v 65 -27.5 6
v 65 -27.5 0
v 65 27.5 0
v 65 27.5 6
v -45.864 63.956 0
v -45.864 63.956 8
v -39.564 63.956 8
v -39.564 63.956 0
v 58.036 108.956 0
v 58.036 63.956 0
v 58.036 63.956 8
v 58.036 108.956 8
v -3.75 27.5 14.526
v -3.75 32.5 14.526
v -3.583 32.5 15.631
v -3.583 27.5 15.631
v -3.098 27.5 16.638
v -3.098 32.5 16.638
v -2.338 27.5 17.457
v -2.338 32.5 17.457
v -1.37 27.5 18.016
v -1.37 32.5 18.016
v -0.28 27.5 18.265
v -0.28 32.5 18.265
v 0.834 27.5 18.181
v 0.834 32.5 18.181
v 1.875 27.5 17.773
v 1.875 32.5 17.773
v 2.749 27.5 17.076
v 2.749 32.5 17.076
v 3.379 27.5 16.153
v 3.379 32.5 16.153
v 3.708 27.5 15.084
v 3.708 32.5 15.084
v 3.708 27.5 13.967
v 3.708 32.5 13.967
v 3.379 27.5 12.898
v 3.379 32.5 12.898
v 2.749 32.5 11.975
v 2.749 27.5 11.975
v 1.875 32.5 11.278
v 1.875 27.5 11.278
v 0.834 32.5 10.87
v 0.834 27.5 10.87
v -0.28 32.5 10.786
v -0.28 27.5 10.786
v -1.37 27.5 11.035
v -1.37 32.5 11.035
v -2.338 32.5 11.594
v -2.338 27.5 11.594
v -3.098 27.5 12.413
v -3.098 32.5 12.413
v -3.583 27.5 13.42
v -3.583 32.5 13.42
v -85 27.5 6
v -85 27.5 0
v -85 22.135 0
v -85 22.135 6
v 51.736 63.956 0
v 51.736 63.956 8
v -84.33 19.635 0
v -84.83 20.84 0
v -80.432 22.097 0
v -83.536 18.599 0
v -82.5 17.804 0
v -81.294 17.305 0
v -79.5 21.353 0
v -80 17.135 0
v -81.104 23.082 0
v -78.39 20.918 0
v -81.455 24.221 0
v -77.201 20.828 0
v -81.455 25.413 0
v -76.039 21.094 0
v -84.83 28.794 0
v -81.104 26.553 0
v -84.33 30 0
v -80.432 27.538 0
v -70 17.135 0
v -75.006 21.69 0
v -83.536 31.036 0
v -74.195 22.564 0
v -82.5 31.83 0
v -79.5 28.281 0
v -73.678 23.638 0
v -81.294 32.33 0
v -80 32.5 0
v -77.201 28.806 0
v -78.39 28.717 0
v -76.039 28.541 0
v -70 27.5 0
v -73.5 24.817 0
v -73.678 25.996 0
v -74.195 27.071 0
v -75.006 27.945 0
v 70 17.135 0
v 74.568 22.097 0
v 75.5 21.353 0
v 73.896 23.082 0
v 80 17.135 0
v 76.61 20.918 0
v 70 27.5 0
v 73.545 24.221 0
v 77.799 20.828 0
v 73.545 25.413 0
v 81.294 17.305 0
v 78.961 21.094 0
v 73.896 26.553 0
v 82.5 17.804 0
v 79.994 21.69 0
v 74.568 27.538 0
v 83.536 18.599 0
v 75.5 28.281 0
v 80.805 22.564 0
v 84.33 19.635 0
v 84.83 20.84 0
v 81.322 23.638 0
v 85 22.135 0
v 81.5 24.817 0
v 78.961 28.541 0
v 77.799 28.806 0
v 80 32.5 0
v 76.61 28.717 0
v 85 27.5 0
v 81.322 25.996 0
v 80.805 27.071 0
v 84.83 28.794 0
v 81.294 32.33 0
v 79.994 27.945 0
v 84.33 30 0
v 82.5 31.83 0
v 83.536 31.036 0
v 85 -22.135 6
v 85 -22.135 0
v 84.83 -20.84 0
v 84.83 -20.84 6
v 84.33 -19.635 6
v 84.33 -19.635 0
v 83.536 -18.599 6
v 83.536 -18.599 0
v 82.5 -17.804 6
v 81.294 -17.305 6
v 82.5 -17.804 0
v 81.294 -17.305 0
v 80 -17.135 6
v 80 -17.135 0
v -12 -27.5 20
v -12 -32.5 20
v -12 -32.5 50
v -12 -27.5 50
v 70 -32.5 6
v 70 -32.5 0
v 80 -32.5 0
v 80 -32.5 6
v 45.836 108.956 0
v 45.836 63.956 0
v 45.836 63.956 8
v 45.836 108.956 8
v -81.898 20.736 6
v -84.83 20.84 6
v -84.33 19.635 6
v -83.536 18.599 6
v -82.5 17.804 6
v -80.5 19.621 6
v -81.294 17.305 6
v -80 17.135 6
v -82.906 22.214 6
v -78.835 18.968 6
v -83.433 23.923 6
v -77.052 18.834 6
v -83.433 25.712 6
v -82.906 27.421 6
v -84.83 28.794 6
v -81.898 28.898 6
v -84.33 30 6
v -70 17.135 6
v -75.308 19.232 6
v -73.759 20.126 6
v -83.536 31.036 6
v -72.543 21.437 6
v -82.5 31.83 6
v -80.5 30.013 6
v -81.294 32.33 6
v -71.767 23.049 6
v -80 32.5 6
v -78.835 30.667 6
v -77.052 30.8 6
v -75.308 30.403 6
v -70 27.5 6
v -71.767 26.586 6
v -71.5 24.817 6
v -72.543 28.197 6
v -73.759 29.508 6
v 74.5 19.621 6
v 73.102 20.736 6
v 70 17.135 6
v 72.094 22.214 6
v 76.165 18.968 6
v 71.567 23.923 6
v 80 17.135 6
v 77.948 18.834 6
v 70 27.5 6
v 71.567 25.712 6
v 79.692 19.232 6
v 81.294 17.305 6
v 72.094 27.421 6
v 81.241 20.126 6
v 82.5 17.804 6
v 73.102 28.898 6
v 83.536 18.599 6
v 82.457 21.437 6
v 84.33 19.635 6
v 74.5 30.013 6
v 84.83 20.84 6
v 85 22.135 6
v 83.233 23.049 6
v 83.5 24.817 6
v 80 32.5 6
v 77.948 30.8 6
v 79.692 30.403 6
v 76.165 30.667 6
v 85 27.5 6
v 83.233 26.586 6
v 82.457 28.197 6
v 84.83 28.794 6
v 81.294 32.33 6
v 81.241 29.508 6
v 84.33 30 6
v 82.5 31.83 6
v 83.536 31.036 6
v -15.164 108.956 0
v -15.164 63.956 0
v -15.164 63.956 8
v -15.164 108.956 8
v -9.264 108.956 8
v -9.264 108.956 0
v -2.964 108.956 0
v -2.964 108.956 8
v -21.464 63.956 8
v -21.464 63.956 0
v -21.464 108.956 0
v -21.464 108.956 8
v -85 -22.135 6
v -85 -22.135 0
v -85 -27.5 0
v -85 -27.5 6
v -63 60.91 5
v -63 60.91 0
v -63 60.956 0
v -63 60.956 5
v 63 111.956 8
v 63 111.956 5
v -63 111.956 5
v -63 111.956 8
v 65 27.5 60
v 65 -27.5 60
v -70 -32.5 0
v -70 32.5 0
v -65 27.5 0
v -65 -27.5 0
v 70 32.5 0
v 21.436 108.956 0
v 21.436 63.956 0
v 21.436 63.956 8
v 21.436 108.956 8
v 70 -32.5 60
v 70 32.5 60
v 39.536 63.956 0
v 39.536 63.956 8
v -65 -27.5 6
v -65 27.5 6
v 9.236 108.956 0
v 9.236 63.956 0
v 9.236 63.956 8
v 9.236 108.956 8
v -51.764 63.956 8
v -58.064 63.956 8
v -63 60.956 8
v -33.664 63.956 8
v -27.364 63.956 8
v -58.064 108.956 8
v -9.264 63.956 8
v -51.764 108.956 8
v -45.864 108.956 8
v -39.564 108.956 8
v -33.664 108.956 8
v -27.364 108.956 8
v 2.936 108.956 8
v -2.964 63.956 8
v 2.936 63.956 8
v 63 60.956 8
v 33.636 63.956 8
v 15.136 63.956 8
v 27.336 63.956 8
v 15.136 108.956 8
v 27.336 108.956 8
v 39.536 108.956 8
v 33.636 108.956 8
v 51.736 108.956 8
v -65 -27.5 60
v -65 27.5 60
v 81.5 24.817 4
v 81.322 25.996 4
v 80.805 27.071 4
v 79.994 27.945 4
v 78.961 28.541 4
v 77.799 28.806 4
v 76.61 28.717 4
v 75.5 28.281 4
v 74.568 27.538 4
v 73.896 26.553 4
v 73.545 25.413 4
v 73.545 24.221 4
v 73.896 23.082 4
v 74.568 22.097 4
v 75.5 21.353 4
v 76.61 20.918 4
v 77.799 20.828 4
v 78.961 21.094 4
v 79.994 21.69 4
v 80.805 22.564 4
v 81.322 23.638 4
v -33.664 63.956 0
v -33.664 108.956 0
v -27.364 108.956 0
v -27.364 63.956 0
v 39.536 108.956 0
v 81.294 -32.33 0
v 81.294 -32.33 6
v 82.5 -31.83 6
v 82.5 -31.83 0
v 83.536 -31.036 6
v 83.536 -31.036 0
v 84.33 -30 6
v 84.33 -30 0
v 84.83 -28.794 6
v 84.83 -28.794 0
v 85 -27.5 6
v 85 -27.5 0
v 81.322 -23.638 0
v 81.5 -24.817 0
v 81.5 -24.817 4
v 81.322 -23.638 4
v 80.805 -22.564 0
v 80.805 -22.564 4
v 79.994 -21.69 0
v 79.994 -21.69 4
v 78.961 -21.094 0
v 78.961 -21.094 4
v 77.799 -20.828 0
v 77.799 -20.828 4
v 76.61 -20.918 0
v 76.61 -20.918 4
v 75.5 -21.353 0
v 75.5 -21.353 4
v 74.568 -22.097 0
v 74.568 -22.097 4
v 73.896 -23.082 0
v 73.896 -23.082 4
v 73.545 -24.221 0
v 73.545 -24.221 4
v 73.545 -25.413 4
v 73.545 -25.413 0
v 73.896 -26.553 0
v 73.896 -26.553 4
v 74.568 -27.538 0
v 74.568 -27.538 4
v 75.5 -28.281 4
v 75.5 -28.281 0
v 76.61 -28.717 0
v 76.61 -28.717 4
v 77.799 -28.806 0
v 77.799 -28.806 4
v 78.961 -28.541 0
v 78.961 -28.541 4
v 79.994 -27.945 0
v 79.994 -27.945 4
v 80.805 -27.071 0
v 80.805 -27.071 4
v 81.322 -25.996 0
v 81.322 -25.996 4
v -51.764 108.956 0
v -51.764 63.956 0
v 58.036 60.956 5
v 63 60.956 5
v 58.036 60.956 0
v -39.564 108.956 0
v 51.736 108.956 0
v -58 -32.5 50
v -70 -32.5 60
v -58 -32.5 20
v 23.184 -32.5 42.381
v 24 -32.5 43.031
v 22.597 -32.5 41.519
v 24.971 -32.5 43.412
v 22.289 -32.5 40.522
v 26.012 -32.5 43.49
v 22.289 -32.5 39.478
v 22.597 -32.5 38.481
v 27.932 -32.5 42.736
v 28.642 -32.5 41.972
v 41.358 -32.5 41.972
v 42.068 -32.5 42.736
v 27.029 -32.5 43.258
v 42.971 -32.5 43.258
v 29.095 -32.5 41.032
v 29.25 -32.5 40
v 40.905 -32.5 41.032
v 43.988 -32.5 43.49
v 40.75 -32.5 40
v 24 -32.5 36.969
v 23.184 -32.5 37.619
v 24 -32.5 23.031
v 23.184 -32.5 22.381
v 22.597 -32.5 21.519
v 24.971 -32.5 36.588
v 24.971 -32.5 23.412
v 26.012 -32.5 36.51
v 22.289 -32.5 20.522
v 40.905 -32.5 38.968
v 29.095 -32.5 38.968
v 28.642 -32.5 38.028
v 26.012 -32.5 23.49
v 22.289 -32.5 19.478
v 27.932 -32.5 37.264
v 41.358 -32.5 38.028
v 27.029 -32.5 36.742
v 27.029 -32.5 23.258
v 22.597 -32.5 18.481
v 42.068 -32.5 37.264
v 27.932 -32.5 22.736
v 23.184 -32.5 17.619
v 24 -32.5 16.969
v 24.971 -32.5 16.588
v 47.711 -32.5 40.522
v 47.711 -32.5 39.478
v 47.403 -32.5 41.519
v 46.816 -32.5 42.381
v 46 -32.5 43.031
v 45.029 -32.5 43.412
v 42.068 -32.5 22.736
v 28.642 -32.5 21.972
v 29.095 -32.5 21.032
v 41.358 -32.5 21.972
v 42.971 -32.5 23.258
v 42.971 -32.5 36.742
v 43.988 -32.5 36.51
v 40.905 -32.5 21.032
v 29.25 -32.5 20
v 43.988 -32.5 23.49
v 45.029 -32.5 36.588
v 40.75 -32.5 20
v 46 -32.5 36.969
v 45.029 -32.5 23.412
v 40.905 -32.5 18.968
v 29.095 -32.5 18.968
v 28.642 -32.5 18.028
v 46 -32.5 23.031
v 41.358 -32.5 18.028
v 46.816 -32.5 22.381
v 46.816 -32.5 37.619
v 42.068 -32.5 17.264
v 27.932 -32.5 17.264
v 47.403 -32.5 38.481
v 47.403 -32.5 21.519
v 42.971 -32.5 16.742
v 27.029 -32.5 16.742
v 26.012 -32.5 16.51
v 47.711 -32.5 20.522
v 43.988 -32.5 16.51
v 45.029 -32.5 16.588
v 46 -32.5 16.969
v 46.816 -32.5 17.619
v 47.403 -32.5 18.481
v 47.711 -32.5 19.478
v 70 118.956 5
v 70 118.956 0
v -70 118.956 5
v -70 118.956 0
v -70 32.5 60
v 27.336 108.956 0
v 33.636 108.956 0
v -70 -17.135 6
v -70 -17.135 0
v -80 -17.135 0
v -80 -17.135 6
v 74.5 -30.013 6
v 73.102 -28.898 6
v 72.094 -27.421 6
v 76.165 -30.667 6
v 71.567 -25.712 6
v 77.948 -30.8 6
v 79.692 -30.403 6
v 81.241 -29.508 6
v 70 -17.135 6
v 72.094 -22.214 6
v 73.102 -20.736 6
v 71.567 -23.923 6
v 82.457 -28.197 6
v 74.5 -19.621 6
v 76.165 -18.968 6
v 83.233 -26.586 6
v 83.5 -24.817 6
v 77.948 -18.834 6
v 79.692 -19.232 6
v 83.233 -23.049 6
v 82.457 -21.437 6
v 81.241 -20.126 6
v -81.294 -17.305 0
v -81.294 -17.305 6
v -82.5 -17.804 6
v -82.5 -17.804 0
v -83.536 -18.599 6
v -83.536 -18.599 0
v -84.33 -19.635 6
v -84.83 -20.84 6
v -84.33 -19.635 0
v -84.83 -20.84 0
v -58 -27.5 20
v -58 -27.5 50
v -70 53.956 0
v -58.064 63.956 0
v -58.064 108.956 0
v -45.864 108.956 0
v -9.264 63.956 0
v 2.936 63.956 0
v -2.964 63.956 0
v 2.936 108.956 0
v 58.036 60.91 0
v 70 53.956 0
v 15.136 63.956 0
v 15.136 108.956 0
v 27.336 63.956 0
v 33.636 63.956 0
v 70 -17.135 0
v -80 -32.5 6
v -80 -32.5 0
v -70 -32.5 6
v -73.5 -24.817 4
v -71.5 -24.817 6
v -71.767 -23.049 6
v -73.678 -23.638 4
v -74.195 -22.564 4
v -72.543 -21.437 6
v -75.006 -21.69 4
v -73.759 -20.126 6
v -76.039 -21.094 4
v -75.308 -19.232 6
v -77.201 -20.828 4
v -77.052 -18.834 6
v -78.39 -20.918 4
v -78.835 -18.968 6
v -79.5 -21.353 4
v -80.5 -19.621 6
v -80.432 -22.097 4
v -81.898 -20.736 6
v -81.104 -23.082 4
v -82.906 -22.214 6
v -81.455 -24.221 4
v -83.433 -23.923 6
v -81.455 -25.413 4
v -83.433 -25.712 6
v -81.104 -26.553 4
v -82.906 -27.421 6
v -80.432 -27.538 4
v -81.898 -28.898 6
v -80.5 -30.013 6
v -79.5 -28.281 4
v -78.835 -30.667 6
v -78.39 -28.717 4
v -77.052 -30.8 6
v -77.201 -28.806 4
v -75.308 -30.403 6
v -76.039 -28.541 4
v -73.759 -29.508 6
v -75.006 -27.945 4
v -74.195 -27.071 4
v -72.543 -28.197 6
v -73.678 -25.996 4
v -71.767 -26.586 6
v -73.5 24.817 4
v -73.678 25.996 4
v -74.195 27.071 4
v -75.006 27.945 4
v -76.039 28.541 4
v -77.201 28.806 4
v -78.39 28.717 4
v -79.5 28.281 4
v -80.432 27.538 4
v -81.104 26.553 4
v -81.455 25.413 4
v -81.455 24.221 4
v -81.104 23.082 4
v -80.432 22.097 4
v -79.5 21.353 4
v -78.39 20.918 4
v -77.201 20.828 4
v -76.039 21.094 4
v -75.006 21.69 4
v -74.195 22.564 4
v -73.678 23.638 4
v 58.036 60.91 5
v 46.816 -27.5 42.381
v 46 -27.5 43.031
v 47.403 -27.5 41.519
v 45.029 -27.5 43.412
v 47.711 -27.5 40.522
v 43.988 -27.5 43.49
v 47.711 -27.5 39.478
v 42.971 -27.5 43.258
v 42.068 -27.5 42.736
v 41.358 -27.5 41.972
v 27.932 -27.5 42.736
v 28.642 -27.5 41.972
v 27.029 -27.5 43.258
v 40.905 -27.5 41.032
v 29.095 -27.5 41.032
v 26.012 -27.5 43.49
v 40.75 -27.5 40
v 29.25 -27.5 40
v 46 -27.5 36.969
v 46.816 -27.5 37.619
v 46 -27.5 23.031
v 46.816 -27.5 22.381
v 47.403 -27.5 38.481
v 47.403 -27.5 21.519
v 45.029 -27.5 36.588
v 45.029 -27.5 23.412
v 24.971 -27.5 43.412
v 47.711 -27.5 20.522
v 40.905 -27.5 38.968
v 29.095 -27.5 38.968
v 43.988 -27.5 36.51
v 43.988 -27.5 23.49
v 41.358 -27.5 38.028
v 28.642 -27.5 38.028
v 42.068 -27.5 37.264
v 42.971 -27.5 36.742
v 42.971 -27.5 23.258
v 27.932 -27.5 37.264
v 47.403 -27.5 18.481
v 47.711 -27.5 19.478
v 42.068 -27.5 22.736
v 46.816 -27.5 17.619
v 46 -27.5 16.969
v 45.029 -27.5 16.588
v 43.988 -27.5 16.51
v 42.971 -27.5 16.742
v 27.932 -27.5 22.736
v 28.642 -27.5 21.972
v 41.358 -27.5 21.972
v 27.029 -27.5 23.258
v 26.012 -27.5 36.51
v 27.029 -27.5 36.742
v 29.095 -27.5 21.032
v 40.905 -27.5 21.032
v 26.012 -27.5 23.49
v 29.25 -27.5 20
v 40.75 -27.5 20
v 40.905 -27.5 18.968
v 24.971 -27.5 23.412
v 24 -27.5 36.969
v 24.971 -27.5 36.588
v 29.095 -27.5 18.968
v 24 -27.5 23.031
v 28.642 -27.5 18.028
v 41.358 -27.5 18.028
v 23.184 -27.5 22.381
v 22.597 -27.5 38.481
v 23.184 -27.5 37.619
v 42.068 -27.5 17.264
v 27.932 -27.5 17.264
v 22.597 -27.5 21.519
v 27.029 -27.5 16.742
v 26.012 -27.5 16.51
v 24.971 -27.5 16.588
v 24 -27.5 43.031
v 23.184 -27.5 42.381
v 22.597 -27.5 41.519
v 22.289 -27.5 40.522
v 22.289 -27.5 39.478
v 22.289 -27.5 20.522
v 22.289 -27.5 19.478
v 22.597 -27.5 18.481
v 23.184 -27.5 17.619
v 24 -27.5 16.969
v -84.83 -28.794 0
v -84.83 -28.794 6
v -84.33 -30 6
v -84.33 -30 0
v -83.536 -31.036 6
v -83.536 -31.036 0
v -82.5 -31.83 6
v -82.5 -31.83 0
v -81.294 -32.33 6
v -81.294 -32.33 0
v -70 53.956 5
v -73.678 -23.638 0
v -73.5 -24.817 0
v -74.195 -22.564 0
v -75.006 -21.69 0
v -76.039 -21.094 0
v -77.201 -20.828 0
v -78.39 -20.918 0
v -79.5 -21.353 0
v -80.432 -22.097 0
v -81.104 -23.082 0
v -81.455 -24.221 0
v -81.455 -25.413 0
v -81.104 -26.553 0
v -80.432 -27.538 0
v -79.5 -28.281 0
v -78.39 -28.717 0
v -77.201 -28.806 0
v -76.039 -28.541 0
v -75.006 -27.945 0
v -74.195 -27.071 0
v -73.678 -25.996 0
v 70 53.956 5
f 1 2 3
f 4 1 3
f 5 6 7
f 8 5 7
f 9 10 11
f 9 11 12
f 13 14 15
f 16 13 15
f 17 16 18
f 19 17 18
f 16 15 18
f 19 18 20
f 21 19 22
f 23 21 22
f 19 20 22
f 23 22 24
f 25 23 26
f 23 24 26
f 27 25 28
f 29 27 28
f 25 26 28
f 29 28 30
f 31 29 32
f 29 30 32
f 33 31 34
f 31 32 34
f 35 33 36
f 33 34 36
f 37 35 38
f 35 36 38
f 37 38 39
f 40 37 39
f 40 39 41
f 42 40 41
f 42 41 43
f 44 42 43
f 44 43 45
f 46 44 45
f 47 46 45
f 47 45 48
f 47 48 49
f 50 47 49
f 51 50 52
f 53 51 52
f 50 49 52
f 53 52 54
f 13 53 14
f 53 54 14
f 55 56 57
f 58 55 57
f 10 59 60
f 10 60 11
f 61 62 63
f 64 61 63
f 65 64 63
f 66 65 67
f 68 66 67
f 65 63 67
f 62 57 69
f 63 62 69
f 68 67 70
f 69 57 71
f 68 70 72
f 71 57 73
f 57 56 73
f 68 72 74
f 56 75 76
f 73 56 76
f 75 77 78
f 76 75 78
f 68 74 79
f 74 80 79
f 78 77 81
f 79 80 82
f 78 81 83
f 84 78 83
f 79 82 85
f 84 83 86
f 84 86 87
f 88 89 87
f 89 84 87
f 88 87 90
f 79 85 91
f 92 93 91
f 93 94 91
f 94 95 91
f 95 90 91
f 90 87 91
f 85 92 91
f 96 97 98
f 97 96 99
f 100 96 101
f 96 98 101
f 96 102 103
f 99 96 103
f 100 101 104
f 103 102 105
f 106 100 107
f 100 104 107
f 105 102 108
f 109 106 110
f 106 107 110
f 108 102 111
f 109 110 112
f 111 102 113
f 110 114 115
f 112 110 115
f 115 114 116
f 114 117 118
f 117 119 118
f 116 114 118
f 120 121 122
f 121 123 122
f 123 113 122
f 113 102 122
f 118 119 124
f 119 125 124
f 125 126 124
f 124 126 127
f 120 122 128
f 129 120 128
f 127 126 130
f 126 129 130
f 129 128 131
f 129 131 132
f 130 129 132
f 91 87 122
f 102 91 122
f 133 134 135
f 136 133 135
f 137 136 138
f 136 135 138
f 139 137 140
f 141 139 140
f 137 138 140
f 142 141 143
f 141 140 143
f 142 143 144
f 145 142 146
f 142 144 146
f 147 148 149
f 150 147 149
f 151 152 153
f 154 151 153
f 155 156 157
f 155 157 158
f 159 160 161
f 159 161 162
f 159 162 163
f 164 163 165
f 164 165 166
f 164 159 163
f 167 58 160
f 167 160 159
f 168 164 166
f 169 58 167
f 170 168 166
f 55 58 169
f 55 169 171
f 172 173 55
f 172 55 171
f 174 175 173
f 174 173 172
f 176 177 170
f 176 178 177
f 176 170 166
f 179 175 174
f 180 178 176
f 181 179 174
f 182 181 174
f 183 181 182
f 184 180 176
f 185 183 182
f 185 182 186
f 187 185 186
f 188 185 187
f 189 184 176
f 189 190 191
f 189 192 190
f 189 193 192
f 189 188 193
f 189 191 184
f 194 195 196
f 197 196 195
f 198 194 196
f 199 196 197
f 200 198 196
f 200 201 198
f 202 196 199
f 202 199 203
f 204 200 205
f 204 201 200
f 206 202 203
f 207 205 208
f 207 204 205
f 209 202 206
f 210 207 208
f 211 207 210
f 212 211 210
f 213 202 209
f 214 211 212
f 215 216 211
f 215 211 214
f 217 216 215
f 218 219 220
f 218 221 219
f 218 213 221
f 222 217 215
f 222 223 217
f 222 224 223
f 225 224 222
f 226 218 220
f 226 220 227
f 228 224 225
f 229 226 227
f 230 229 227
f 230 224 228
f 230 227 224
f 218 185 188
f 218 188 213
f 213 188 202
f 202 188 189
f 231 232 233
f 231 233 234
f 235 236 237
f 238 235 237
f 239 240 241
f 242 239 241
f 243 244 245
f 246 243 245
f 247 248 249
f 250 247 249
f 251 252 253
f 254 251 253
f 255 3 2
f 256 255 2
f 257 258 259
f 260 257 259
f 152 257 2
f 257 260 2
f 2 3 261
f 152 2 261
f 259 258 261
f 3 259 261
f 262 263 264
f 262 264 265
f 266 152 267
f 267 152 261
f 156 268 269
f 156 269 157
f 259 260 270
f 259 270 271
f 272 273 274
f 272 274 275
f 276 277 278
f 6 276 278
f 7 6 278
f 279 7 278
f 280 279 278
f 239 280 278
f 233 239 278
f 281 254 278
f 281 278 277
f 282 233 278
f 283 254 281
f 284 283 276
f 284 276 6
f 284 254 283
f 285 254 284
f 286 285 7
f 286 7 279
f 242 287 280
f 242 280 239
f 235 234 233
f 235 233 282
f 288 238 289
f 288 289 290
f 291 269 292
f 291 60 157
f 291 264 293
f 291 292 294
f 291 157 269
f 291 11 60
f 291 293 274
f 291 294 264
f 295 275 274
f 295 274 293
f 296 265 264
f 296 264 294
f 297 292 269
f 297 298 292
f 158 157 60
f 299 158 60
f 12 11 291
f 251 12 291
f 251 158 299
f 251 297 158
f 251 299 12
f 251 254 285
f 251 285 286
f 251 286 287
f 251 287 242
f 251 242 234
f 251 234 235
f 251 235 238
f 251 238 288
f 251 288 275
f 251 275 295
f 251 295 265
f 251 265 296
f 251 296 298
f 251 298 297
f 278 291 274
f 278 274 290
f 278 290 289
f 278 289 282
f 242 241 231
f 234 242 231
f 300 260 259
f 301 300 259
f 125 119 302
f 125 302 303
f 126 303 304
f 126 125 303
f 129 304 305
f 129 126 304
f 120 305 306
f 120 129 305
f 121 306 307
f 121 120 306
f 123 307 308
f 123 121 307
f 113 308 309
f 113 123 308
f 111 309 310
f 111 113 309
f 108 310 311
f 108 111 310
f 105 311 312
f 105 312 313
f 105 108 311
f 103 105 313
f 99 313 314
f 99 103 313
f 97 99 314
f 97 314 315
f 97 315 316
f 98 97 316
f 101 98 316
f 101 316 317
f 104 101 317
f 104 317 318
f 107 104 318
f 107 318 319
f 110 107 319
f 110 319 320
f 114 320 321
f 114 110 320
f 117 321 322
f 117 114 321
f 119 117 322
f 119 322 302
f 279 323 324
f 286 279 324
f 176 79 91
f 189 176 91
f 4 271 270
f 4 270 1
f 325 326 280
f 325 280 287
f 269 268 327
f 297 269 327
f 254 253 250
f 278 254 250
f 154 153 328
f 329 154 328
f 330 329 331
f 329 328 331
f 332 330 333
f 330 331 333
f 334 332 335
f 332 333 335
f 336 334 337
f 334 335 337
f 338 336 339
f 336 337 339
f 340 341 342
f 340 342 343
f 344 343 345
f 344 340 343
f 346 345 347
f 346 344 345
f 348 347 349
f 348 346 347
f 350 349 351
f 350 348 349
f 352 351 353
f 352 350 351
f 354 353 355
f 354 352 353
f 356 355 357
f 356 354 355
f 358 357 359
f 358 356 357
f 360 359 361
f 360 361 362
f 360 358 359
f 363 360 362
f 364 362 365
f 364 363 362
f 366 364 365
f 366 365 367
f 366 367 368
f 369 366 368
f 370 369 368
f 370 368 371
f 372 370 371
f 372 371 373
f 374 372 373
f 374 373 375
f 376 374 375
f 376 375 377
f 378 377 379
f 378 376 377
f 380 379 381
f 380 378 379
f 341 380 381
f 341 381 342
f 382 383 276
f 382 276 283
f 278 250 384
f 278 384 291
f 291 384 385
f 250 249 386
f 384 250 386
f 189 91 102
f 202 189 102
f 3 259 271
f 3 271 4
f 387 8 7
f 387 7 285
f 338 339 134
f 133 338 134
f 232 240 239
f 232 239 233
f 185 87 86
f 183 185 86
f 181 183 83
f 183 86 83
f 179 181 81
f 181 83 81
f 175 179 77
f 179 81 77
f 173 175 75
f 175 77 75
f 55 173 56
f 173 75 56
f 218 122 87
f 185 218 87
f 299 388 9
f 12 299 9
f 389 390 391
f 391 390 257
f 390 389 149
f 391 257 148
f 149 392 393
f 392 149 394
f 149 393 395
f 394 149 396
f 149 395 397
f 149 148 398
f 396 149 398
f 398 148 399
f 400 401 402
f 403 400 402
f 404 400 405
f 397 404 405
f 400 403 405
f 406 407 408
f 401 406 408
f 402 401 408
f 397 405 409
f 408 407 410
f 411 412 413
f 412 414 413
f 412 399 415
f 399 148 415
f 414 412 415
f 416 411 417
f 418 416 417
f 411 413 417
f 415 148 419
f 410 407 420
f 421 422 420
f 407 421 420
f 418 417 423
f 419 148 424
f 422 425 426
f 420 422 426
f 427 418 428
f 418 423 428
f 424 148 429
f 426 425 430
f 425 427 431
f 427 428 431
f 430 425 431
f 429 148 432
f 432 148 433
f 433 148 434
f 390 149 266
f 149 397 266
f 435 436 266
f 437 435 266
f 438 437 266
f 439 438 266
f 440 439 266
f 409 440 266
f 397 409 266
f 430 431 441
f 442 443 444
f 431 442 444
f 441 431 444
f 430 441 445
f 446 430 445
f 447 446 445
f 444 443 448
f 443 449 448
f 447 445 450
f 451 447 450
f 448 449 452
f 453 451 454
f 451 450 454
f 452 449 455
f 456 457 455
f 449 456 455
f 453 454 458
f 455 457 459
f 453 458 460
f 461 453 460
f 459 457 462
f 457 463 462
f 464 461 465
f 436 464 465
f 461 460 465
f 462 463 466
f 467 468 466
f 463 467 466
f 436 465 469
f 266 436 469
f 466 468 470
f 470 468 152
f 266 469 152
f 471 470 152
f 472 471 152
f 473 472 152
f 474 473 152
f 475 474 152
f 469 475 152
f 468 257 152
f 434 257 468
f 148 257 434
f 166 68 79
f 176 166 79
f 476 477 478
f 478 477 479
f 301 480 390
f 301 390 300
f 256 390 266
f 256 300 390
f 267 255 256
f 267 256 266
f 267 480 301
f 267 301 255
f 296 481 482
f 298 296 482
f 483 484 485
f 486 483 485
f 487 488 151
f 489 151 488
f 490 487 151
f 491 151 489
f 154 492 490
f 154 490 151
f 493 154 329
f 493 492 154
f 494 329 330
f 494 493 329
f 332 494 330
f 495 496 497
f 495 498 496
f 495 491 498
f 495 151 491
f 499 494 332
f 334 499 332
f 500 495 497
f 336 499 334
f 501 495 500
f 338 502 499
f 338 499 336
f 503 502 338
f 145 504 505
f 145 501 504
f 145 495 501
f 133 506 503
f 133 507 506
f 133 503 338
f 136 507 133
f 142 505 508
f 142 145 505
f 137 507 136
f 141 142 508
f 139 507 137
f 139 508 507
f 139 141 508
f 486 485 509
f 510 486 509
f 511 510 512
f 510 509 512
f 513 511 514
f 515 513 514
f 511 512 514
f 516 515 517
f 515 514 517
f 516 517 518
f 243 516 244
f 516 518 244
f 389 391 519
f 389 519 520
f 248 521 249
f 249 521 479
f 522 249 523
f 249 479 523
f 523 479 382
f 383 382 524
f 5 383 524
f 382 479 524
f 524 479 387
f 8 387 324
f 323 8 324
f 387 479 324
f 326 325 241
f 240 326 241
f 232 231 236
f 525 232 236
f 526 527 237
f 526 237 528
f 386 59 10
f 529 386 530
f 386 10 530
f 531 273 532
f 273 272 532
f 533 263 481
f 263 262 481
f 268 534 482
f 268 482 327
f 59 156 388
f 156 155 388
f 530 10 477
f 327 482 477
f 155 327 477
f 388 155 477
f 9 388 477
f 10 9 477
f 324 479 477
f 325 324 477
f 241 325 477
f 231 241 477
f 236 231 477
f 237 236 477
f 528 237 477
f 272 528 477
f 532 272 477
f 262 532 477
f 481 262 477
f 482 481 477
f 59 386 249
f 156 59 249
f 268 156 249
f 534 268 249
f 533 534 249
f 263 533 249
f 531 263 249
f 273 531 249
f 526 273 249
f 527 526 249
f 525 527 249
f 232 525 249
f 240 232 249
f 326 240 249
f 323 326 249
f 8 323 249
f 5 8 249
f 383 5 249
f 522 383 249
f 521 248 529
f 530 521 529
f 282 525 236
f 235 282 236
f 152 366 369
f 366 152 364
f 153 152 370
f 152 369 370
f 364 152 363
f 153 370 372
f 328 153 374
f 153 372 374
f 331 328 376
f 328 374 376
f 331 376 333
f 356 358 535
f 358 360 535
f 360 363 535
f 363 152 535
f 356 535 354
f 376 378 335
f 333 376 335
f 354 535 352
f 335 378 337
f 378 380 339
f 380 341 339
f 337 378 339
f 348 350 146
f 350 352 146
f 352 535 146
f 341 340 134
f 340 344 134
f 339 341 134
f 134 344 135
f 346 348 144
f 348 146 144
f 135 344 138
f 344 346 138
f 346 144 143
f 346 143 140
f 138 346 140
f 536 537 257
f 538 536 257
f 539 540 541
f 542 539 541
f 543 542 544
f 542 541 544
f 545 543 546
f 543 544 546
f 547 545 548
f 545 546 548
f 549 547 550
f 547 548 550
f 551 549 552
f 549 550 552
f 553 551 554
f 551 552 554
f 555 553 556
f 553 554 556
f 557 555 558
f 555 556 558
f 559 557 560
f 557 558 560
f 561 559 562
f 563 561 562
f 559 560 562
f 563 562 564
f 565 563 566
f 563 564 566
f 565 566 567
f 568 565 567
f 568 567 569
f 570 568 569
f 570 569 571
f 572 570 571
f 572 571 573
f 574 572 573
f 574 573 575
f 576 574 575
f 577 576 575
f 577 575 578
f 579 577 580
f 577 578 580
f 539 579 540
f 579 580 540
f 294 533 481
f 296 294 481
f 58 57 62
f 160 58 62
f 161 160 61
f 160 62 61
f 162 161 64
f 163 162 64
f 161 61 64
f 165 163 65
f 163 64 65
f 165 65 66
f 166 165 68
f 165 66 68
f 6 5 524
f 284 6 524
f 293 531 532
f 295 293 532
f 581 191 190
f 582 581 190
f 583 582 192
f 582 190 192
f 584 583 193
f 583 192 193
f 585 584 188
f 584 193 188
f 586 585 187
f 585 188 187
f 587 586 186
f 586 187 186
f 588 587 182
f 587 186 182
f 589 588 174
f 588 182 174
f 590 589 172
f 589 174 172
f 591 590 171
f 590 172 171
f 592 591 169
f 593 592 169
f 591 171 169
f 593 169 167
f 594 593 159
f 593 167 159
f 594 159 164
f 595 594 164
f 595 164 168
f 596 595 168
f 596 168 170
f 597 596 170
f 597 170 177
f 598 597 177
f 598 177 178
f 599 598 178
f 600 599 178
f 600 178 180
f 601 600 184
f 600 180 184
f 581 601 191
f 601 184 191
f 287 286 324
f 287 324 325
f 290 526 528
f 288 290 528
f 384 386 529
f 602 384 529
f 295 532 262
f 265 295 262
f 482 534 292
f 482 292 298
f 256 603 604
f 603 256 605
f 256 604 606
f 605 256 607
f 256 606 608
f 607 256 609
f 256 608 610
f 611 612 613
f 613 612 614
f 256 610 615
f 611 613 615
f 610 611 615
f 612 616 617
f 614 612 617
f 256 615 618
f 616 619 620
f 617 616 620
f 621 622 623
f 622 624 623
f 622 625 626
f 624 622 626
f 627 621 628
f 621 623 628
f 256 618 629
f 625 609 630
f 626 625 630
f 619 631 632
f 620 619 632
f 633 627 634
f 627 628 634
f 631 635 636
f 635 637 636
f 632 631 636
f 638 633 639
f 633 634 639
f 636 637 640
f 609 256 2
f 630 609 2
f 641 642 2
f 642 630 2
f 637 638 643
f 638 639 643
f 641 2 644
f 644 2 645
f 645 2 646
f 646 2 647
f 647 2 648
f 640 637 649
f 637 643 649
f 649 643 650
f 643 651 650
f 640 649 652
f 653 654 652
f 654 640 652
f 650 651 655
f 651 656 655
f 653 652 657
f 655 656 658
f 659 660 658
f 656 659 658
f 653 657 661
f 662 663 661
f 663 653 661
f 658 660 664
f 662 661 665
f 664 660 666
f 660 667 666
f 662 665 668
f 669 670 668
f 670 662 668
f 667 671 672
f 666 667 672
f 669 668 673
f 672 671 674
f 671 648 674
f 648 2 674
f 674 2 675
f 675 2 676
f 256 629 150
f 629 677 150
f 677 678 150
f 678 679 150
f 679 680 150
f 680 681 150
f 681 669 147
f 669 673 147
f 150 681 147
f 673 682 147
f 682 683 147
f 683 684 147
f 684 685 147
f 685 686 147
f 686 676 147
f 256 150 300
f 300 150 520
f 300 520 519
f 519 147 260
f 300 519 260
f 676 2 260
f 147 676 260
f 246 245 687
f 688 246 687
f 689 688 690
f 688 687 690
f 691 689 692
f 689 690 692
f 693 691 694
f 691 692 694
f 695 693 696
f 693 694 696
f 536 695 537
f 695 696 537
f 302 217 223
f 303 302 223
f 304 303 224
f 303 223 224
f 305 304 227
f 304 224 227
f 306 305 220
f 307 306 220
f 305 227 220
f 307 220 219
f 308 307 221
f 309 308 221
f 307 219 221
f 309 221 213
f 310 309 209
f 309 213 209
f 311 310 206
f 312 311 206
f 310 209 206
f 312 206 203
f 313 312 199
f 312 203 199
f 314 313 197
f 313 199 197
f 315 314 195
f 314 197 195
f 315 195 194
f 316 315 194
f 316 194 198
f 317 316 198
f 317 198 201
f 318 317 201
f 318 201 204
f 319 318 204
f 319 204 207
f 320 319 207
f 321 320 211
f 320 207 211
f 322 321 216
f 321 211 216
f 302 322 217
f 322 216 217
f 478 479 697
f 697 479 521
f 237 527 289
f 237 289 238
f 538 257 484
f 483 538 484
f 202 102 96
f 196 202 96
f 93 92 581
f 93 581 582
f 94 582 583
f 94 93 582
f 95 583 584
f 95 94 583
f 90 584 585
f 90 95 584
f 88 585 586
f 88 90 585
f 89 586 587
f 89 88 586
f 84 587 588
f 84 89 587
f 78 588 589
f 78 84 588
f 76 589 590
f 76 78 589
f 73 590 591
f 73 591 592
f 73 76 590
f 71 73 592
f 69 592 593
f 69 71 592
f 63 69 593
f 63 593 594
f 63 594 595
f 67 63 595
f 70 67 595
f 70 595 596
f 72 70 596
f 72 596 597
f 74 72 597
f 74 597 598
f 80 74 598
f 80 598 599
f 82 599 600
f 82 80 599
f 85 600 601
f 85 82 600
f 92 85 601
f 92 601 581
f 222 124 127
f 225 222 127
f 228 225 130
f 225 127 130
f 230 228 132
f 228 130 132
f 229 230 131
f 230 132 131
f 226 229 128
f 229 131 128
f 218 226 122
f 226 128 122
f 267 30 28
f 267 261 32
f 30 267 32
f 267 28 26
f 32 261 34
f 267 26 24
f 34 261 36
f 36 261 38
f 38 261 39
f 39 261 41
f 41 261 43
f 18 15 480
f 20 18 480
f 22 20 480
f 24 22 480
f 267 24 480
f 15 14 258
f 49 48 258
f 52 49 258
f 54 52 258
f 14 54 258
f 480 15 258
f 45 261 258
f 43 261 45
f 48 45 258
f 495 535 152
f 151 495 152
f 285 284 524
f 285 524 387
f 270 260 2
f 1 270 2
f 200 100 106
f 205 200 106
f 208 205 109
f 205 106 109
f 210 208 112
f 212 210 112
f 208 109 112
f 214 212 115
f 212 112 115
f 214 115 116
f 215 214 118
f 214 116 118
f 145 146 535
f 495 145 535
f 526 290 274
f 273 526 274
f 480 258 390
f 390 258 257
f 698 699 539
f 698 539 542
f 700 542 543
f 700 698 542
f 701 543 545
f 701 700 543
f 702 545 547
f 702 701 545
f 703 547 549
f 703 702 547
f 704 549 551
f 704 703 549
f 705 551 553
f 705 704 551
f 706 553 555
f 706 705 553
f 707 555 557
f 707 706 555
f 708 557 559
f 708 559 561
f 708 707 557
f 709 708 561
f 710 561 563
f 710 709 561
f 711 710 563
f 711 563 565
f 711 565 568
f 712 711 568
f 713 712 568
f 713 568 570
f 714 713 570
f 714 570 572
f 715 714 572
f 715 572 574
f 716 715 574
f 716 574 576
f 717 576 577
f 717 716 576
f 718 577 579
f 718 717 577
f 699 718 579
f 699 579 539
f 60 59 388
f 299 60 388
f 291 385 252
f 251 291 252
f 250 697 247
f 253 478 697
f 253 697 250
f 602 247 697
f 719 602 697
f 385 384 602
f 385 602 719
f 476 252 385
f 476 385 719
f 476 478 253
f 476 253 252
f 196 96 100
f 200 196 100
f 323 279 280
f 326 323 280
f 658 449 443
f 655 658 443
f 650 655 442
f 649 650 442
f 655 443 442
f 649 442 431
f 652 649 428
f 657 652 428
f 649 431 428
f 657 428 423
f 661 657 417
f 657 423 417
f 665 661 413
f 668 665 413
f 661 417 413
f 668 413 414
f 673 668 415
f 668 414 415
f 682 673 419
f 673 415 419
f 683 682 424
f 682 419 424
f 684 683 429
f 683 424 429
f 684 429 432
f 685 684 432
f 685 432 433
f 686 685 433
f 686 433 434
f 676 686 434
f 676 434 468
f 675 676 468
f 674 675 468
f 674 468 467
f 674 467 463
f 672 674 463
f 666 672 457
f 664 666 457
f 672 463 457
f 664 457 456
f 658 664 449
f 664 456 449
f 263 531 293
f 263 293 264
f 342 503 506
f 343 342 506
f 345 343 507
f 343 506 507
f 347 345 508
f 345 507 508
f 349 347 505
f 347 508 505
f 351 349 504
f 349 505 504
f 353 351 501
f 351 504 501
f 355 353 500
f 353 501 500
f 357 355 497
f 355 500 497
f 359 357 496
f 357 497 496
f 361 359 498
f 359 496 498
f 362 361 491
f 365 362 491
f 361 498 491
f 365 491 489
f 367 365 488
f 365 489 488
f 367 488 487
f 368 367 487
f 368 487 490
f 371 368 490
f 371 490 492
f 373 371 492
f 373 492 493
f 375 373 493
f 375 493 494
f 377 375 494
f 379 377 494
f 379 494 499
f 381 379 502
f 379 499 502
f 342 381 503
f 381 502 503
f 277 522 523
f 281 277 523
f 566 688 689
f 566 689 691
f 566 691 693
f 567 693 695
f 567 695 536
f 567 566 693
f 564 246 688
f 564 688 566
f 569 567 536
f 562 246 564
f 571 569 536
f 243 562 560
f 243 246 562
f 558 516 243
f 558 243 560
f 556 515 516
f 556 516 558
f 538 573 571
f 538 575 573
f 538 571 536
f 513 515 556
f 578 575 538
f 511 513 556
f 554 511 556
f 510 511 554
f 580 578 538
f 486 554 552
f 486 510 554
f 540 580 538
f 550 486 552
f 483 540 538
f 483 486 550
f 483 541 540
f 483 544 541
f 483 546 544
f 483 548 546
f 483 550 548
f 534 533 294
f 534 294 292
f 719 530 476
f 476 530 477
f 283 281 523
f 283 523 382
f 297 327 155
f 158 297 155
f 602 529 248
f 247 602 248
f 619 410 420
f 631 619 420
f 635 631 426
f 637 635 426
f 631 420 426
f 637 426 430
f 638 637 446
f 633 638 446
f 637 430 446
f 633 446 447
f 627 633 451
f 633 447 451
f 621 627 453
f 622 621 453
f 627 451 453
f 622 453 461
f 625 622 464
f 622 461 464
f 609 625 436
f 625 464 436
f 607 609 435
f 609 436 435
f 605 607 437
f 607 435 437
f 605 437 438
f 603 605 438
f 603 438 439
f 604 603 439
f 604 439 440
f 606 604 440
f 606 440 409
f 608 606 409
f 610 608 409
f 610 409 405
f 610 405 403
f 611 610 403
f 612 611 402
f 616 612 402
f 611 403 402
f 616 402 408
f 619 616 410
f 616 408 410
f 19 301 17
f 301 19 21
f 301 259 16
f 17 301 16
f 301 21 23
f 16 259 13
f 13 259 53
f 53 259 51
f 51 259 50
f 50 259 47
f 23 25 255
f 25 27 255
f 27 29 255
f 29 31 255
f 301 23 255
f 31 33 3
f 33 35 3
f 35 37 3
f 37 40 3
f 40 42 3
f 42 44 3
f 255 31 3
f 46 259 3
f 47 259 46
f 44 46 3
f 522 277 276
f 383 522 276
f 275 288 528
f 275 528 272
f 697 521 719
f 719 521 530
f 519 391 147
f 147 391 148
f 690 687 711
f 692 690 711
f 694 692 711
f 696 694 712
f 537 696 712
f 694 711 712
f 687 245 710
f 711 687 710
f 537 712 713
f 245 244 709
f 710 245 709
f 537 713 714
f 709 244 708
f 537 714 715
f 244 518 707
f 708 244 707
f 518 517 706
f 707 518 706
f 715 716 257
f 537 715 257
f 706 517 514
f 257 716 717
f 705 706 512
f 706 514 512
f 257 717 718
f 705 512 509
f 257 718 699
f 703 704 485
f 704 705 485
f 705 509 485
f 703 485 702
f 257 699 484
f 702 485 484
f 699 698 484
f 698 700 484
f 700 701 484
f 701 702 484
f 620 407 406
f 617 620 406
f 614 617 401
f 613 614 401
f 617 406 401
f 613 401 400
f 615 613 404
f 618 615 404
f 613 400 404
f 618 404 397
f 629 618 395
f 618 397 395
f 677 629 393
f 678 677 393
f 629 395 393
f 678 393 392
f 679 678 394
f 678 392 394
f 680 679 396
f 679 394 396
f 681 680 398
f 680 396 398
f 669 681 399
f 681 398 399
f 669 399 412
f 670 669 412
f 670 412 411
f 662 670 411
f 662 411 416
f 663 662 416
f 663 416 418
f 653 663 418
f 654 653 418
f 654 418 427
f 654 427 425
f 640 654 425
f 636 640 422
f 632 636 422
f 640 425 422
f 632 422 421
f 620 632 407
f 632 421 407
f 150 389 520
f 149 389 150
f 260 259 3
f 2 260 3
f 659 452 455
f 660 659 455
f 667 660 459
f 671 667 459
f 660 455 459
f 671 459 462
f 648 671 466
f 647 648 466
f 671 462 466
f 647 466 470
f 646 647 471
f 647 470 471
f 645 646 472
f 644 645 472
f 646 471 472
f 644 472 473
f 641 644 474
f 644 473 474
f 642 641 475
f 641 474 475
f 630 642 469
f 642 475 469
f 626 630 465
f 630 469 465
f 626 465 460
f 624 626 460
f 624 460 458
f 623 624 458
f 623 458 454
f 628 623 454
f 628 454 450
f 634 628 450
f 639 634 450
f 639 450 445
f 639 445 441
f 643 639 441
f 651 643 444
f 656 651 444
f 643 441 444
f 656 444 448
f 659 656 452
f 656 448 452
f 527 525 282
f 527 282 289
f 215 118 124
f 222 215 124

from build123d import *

# Parameters (mm, degrees)
F0_R      = 4
F0_W      = 5
F0_H      = 5
F0_W_2    = 130
F1_DEPTH  = 6
F2_SIZE   = 2
F2_2_SIZE = 2
F2_3_SIZE = 2
F3_DEPTH  = 60
F0_H_2    = 55
F4_DEPTH  = 6
F5_W      = 46
F5_H      = 30
F5_R      = 3.5
F6_DEPTH  = 5
F7_R      = 3.75
F8_DEPTH  = 5
F0_W_3    = 7
F0_H_3    = 7
F0_H_4    = 51
F9_DEPTH  = 5
F0_W_4    = 6.3
F0_H_5    = 45
F0_W_5    = 5.9
F0_W_6    = 1.9635334134
F0_W_7    = 1.9364665866
F0_H_6    = 3
F10_DEPTH = 8
F11_DEPTH = 25


with BuildPart() as f1:
    # F0 (on Top) → F1 (new body)
    with BuildSketch(Plane.XY):
        with BuildLine():
            Line((-70, 27.5), (-70, 32.5))
            Line((-70, 32.5), (-80, 32.5))
            ThreePointArc((-80, 32.5), (-83.5355339059, 31.0355339059), (-85, 27.5))
            Line((-85, 27.5), (-85, 22.1345490962))
            ThreePointArc((-85, 22.1345490962), (-83.5355339059, 18.5990151903), (-80, 17.1345490962))
            Line((-80, 17.1345490962), (-70, 17.1345490962))
            Line((-70, 17.1345490962), (-70, 27.5))
        make_face()
        with Locations((-77.5, 24.8172745481)):
            Circle(F0_R, mode=Mode.SUBTRACT)
        with Locations((-67.5, 30)):
            Rectangle(F0_W, F0_H)
        with Locations((0, 30)):
            Rectangle(F0_W_2, F0_H)
        with Locations((67.5, 30)):
            Rectangle(F0_W, F0_H)
        with BuildLine():
            Line((80, 32.5), (70, 32.5))
            Line((70, 32.5), (70, 27.5))
            Line((70, 27.5), (70, 17.1345490962))
            Line((70, 17.1345490962), (80, 17.1345490962))
            ThreePointArc((80, 17.1345490962), (83.5355339059, 18.5990151903), (85, 22.1345490962))
            Line((85, 22.1345490962), (85, 27.5))
            ThreePointArc((85, 27.5), (83.5355339059, 31.0355339059), (80, 32.5))
        make_face()
        with Locations((77.5, 24.8172745481)):
            Circle(F0_R, mode=Mode.SUBTRACT)
    extrude(amount=F1_DEPTH)

    # F2
    f2_edges = [f1.edges().sort_by_distance(p)[0] for p in [
        (-81.5, 24.817275, 6),
        (73.5, 24.817275, 6),
    ]]
    chamfer(f2_edges, length=F2_SIZE)


with BuildPart() as f1b:
    # F0 (on Top) → F1, piece 2 (new body)
    with BuildSketch(Plane.XY):
        with BuildLine():
            Line((-70, -27.5), (-70, -17.1345490962))
            Line((-70, -17.1345490962), (-80, -17.1345490962))
            ThreePointArc((-80, -17.1345490962), (-83.5355339059, -18.5990151903), (-85, -22.1345490962))
            Line((-85, -22.1345490962), (-85, -27.5))
            ThreePointArc((-85, -27.5), (-83.5355339059, -31.0355339059), (-80, -32.5))
            Line((-80, -32.5), (-70, -32.5))
            Line((-70, -32.5), (-70, -27.5))
        make_face()
        with Locations((-77.5, -24.8172745481)):
            Circle(F0_R, mode=Mode.SUBTRACT)
    extrude(amount=F1_DEPTH)

    # F2#2
    f2_2_edges = [f1b.edges().sort_by_distance(p)[0] for p in [
        (-81.5, -24.817275, 6),
    ]]
    chamfer(f2_2_edges, length=F2_2_SIZE)


with BuildPart() as f1c:
    # F0 (on Top) → F1, piece 3 (new body)
    with BuildSketch(Plane.XY):
        with BuildLine():
            Line((70, -17.1345490962), (70, -27.5))
            Line((70, -27.5), (70, -32.5))
            Line((70, -32.5), (80, -32.5))
            ThreePointArc((80, -32.5), (83.5355339059, -31.0355339059), (85, -27.5))
            Line((85, -27.5), (85, -22.1345490962))
            ThreePointArc((85, -22.1345490962), (83.5355339059, -18.5990151903), (80, -17.1345490962))
            Line((80, -17.1345490962), (70, -17.1345490962))
        make_face()
        with Locations((77.5, -24.8172745481)):
            Circle(F0_R, mode=Mode.SUBTRACT)
    extrude(amount=F1_DEPTH)

    # F2#3
    f2_3_edges = [f1c.edges().sort_by_distance(p)[0] for p in [
        (73.5, -24.817275, 6),
    ]]
    chamfer(f2_3_edges, length=F2_3_SIZE)


with BuildPart() as f3:
    # F0 (on Top) → F3 (new body)
    with BuildSketch(Plane.XY):
        Polygon((-65, 27.5), (-70, 27.5), (-70, 17.1345490962), (-70, -17.1345490962), (-70, -27.5), (-65, -27.5), align=None)
        with Locations((0, -30)):
            Rectangle(F0_W_2, F0_H)
        with Locations((-67.5, -30)):
            Rectangle(F0_W, F0_H)
        with Locations((67.5, -30)):
            Rectangle(F0_W, F0_H)
        Polygon((70, 27.5), (65, 27.5), (65, -27.5), (70, -27.5), (70, -17.1345490962), (70, 17.1345490962), align=None)
        with Locations((67.5, 30)):
            Rectangle(F0_W, F0_H)
        with Locations((0, 30)):
            Rectangle(F0_W_2, F0_H)
        with Locations((-67.5, 30)):
            Rectangle(F0_W, F0_H)
    extrude(amount=F3_DEPTH)

    # F5 (on face) → F6 (cut)
    with BuildSketch(Plane.XZ.offset(32.5)):
        with Locations((-35, 35)):
            Rectangle(F5_W, F5_H)
        with Locations((25.75, 40)):
            Circle(F5_R)
        with Locations((25.75, 20)):
            Circle(F5_R)
        with BuildLine():
            ThreePointArc((47.75, 40), (44.25, 43.5), (40.75, 40))
            ThreePointArc((40.75, 40), (44.25, 36.5), (47.75, 40))
        make_face()
        with BuildLine():
            ThreePointArc((47.75, 20), (44.25, 23.5), (40.75, 20))
            ThreePointArc((40.75, 20), (44.25, 16.5), (47.75, 20))
        make_face()
    extrude(amount=-F6_DEPTH, mode=Mode.SUBTRACT)

    # F7 (on face) → F8 (cut)
    with BuildSketch(Plane(origin=(0, 32.5, 0), x_dir=(-1, 0, 0), z_dir=(0, 1, 0))):
        with Locations((0, 14.525502791)):
            Circle(F7_R)
    extrude(amount=-F8_DEPTH, mode=Mode.SUBTRACT)


with BuildPart() as f4:
    # F0 (on Top) → F4 (new body)
    with BuildSketch(Plane.XY):
        Rectangle(F0_W_2, F0_H_2)
    extrude(amount=F4_DEPTH)


with BuildPart() as f9:
    # F0 (on Top) → F9 (new body)
    with BuildSketch(Plane.XY):
        with Locations((66.5, 115.4563803077)):
            Rectangle(F0_W_3, F0_H_3)
        Polygon((63, 118.9563803077), (-63, 118.9563803077), (-63, 112.5258132815), (-63, 111.9563803077), (-58.0635334134, 111.9563803077), (-51.7635334134, 111.9563803077), (-45.8635334134, 111.9563803077), (-39.5635334134, 111.9563803077), (-33.6635334134, 111.9563803077), (-27.3635334134, 111.9563803077), (-21.4635334134, 111.9563803077), (-15.1635334134, 111.9563803077), (-9.2635334134, 111.9563803077), (-2.9635334134, 111.9563803077), (2.9364665866, 111.9563803077), (9.2364665866, 111.9563803077), (15.1364665866, 111.9563803077), (21.4364665866, 111.9563803077), (27.3364665866, 111.9563803077), (33.6364665866, 111.9563803077), (39.5364665866, 111.9563803077), (45.8364665866, 111.9563803077), (51.7364665866, 111.9563803077), (58.0364665866, 111.9563803077), (63, 111.9563803077), align=None)
        with Locations((66.5, 86.4563803077)):
            Rectangle(F0_W_3, F0_H_4)
        with Locations((66.5, 57.4563803077)):
            Rectangle(F0_W_3, F0_H_3)
        Polygon((63, 53.9563803077), (63, 60.9563803077), (58.0364665866, 60.9563803077), (58.0364665866, 60.9103041655), (51.7364665866, 60.9103041655), (45.8364665866, 60.9103041655), (39.5364665866, 60.9103041655), (33.6364665866, 60.9103041655), (27.3364665866, 60.9103041655), (21.4364665866, 60.9103041655), (15.1364665866, 60.9103041655), (9.2364665866, 60.9103041655), (2.9364665866, 60.9103041655), (-2.9635334134, 60.9103041655), (-9.2635334134, 60.9103041655), (-15.1635334134, 60.9103041655), (-21.4635334134, 60.9103041655), (-27.3635334134, 60.9103041655), (-33.6635334134, 60.9103041655), (-39.5635334134, 60.9103041655), (-45.8635334134, 60.9103041655), (-51.7635334134, 60.9103041655), (-58.0635334134, 60.9103041655), (-63, 60.9103041655), (-63, 53.9563803077), align=None)
        Polygon((-63, 60.9563803077), (-70, 60.9563803077), (-70, 53.9563803077), (-63, 53.9563803077), (-63, 60.9103041655), align=None)
        with Locations((-66.5, 86.4563803077)):
            Rectangle(F0_W_3, F0_H_4)
        Polygon((-63, 118.9563803077), (-70, 118.9563803077), (-70, 111.9563803077), (-63, 111.9563803077), (-63, 112.5258132815), align=None)
    extrude(amount=F9_DEPTH)

    # F0 (on Top) → F10 (join)
    with BuildSketch(Plane.XY):
        with Locations((-54.9135334134, 86.4563803077)):
            Rectangle(F0_W_4, F0_H_5)
        with Locations((-48.8135334134, 86.4563803077)):
            Rectangle(F0_W_5, F0_H_5)
        with Locations((-42.7135334134, 86.4563803077)):
            Rectangle(F0_W_4, F0_H_5)
        with Locations((-36.6135334134, 86.4563803077)):
            Rectangle(F0_W_5, F0_H_5)
        with Locations((-30.5135334134, 86.4563803077)):
            Rectangle(F0_W_4, F0_H_5)
        with Locations((-24.4135334134, 86.4563803077)):
            Rectangle(F0_W_5, F0_H_5)
        with Locations((-18.3135334134, 86.4563803077)):
            Rectangle(F0_W_4, F0_H_5)
        with Locations((-12.2135334134, 86.4563803077)):
            Rectangle(F0_W_5, F0_H_5)
        with Locations((-6.1135334134, 86.4563803077)):
            Rectangle(F0_W_4, F0_H_5)
        with Locations((-0.0135334134, 86.4563803077)):
            Rectangle(F0_W_5, F0_H_5)
        with Locations((6.0864665866, 86.4563803077)):
            Rectangle(F0_W_4, F0_H_5)
        with Locations((12.1864665866, 86.4563803077)):
            Rectangle(F0_W_5, F0_H_5)
        with Locations((18.2864665866, 86.4563803077)):
            Rectangle(F0_W_4, F0_H_5)
        with Locations((24.3864665866, 86.4563803077)):
            Rectangle(F0_W_5, F0_H_5)
        with Locations((30.4864665866, 86.4563803077)):
            Rectangle(F0_W_4, F0_H_5)
        with Locations((36.5864665866, 86.4563803077)):
            Rectangle(F0_W_5, F0_H_5)
        with Locations((42.6864665866, 86.4563803077)):
            Rectangle(F0_W_4, F0_H_5)
        with Locations((48.7864665866, 86.4563803077)):
            Rectangle(F0_W_5, F0_H_5)
        with Locations((54.8864665866, 86.4563803077)):
            Rectangle(F0_W_4, F0_H_5)
        with Locations((59.0182332933, 86.4563803077)):
            Rectangle(F0_W_6, F0_H_5)
        Polygon((63, 60.9563803077), (63, 111.9563803077), (58.0364665866, 111.9563803077), (58.0364665866, 108.9563803077), (60, 108.9563803077), (60, 63.9563803077), (58.0364665866, 63.9563803077), (58.0364665866, 60.9563803077), align=None)
        Polygon((-58.0635334134, 111.9563803077), (-63, 111.9563803077), (-63, 60.9563803077), (-58.0635334134, 60.9563803077), (-58.0635334134, 63.9563803077), (-60, 63.9563803077), (-60, 108.9563803077), (-58.0635334134, 108.9563803077), align=None)
        with Locations((-59.0317667067, 86.4563803077)):
            Rectangle(F0_W_7, F0_H_5)
        with Locations((-54.9135334134, 62.4563803077)):
            Rectangle(F0_W_4, F0_H_6)
        with Locations((-48.8135334134, 62.4563803077)):
            Rectangle(F0_W_5, F0_H_6)
        with Locations((-42.7135334134, 62.4563803077)):
            Rectangle(F0_W_4, F0_H_6)
        with Locations((-36.6135334134, 62.4563803077)):
            Rectangle(F0_W_5, F0_H_6)
        with Locations((-30.5135334134, 62.4563803077)):
            Rectangle(F0_W_4, F0_H_6)
        with Locations((-24.4135334134, 62.4563803077)):
            Rectangle(F0_W_5, F0_H_6)
        with Locations((-18.3135334134, 62.4563803077)):
            Rectangle(F0_W_4, F0_H_6)
        with Locations((-12.2135334134, 62.4563803077)):
            Rectangle(F0_W_5, F0_H_6)
        with Locations((-6.1135334134, 62.4563803077)):
            Rectangle(F0_W_4, F0_H_6)
        with Locations((-0.0135334134, 62.4563803077)):
            Rectangle(F0_W_5, F0_H_6)
        with Locations((6.0864665866, 62.4563803077)):
            Rectangle(F0_W_4, F0_H_6)
        with Locations((12.1864665866, 62.4563803077)):
            Rectangle(F0_W_5, F0_H_6)
        with Locations((18.2864665866, 62.4563803077)):
            Rectangle(F0_W_4, F0_H_6)
        with Locations((24.3864665866, 62.4563803077)):
            Rectangle(F0_W_5, F0_H_6)
        with Locations((30.4864665866, 62.4563803077)):
            Rectangle(F0_W_4, F0_H_6)
        with Locations((36.5864665866, 62.4563803077)):
            Rectangle(F0_W_5, F0_H_6)
        with Locations((42.6864665866, 62.4563803077)):
            Rectangle(F0_W_4, F0_H_6)
        with Locations((48.7864665866, 62.4563803077)):
            Rectangle(F0_W_5, F0_H_6)
        with Locations((54.8864665866, 62.4563803077)):
            Rectangle(F0_W_4, F0_H_6)
        with Locations((54.8864665866, 110.4563803077)):
            Rectangle(F0_W_4, F0_H_6)
        with Locations((48.7864665866, 110.4563803077)):
            Rectangle(F0_W_5, F0_H_6)
        with Locations((42.6864665866, 110.4563803077)):
            Rectangle(F0_W_4, F0_H_6)
        with Locations((36.5864665866, 110.4563803077)):
            Rectangle(F0_W_5, F0_H_6)
        with Locations((30.4864665866, 110.4563803077)):
            Rectangle(F0_W_4, F0_H_6)
        with Locations((24.3864665866, 110.4563803077)):
            Rectangle(F0_W_5, F0_H_6)
        with Locations((18.2864665866, 110.4563803077)):
            Rectangle(F0_W_4, F0_H_6)
        with Locations((12.1864665866, 110.4563803077)):
            Rectangle(F0_W_5, F0_H_6)
        with Locations((6.0864665866, 110.4563803077)):
            Rectangle(F0_W_4, F0_H_6)
        with Locations((-0.0135334134, 110.4563803077)):
            Rectangle(F0_W_5, F0_H_6)
        with Locations((-6.1135334134, 110.4563803077)):
            Rectangle(F0_W_4, F0_H_6)
        with Locations((-12.2135334134, 110.4563803077)):
            Rectangle(F0_W_5, F0_H_6)
        with Locations((-18.3135334134, 110.4563803077)):
            Rectangle(F0_W_4, F0_H_6)
        with Locations((-24.4135334134, 110.4563803077)):
            Rectangle(F0_W_5, F0_H_6)
        with Locations((-30.5135334134, 110.4563803077)):
            Rectangle(F0_W_4, F0_H_6)
        with Locations((-54.9135334134, 110.4563803077)):
            Rectangle(F0_W_4, F0_H_6)
        with Locations((-48.8135334134, 110.4563803077)):
            Rectangle(F0_W_5, F0_H_6)
        with Locations((-42.7135334134, 110.4563803077)):
            Rectangle(F0_W_4, F0_H_6)
        with Locations((-36.6135334134, 110.4563803077)):
            Rectangle(F0_W_5, F0_H_6)
    extrude(amount=F10_DEPTH)

    # F0 (on Top) → F11 (cut)
    with BuildSketch(Plane.XY):
        with Locations((54.8864665866, 86.4563803077)):
            Rectangle(F0_W_4, F0_H_5)
        with Locations((42.6864665866, 86.4563803077)):
            Rectangle(F0_W_4, F0_H_5)
        with Locations((30.4864665866, 86.4563803077)):
            Rectangle(F0_W_4, F0_H_5)
        with Locations((18.2864665866, 86.4563803077)):
            Rectangle(F0_W_4, F0_H_5)
        with Locations((6.0864665866, 86.4563803077)):
            Rectangle(F0_W_4, F0_H_5)
        with Locations((-6.1135334134, 86.4563803077)):
            Rectangle(F0_W_4, F0_H_5)
        with Locations((-18.3135334134, 86.4563803077)):
            Rectangle(F0_W_4, F0_H_5)
        with Locations((-30.5135334134, 86.4563803077)):
            Rectangle(F0_W_4, F0_H_5)
        with Locations((-42.7135334134, 86.4563803077)):
            Rectangle(F0_W_4, F0_H_5)
        with Locations((-54.9135334134, 86.4563803077)):
            Rectangle(F0_W_4, F0_H_5)
    extrude(amount=F11_DEPTH, mode=Mode.SUBTRACT)


solid = Compound([f1.part, f1b.part, f1c.part, f3.part, f4.part, f9.part])
